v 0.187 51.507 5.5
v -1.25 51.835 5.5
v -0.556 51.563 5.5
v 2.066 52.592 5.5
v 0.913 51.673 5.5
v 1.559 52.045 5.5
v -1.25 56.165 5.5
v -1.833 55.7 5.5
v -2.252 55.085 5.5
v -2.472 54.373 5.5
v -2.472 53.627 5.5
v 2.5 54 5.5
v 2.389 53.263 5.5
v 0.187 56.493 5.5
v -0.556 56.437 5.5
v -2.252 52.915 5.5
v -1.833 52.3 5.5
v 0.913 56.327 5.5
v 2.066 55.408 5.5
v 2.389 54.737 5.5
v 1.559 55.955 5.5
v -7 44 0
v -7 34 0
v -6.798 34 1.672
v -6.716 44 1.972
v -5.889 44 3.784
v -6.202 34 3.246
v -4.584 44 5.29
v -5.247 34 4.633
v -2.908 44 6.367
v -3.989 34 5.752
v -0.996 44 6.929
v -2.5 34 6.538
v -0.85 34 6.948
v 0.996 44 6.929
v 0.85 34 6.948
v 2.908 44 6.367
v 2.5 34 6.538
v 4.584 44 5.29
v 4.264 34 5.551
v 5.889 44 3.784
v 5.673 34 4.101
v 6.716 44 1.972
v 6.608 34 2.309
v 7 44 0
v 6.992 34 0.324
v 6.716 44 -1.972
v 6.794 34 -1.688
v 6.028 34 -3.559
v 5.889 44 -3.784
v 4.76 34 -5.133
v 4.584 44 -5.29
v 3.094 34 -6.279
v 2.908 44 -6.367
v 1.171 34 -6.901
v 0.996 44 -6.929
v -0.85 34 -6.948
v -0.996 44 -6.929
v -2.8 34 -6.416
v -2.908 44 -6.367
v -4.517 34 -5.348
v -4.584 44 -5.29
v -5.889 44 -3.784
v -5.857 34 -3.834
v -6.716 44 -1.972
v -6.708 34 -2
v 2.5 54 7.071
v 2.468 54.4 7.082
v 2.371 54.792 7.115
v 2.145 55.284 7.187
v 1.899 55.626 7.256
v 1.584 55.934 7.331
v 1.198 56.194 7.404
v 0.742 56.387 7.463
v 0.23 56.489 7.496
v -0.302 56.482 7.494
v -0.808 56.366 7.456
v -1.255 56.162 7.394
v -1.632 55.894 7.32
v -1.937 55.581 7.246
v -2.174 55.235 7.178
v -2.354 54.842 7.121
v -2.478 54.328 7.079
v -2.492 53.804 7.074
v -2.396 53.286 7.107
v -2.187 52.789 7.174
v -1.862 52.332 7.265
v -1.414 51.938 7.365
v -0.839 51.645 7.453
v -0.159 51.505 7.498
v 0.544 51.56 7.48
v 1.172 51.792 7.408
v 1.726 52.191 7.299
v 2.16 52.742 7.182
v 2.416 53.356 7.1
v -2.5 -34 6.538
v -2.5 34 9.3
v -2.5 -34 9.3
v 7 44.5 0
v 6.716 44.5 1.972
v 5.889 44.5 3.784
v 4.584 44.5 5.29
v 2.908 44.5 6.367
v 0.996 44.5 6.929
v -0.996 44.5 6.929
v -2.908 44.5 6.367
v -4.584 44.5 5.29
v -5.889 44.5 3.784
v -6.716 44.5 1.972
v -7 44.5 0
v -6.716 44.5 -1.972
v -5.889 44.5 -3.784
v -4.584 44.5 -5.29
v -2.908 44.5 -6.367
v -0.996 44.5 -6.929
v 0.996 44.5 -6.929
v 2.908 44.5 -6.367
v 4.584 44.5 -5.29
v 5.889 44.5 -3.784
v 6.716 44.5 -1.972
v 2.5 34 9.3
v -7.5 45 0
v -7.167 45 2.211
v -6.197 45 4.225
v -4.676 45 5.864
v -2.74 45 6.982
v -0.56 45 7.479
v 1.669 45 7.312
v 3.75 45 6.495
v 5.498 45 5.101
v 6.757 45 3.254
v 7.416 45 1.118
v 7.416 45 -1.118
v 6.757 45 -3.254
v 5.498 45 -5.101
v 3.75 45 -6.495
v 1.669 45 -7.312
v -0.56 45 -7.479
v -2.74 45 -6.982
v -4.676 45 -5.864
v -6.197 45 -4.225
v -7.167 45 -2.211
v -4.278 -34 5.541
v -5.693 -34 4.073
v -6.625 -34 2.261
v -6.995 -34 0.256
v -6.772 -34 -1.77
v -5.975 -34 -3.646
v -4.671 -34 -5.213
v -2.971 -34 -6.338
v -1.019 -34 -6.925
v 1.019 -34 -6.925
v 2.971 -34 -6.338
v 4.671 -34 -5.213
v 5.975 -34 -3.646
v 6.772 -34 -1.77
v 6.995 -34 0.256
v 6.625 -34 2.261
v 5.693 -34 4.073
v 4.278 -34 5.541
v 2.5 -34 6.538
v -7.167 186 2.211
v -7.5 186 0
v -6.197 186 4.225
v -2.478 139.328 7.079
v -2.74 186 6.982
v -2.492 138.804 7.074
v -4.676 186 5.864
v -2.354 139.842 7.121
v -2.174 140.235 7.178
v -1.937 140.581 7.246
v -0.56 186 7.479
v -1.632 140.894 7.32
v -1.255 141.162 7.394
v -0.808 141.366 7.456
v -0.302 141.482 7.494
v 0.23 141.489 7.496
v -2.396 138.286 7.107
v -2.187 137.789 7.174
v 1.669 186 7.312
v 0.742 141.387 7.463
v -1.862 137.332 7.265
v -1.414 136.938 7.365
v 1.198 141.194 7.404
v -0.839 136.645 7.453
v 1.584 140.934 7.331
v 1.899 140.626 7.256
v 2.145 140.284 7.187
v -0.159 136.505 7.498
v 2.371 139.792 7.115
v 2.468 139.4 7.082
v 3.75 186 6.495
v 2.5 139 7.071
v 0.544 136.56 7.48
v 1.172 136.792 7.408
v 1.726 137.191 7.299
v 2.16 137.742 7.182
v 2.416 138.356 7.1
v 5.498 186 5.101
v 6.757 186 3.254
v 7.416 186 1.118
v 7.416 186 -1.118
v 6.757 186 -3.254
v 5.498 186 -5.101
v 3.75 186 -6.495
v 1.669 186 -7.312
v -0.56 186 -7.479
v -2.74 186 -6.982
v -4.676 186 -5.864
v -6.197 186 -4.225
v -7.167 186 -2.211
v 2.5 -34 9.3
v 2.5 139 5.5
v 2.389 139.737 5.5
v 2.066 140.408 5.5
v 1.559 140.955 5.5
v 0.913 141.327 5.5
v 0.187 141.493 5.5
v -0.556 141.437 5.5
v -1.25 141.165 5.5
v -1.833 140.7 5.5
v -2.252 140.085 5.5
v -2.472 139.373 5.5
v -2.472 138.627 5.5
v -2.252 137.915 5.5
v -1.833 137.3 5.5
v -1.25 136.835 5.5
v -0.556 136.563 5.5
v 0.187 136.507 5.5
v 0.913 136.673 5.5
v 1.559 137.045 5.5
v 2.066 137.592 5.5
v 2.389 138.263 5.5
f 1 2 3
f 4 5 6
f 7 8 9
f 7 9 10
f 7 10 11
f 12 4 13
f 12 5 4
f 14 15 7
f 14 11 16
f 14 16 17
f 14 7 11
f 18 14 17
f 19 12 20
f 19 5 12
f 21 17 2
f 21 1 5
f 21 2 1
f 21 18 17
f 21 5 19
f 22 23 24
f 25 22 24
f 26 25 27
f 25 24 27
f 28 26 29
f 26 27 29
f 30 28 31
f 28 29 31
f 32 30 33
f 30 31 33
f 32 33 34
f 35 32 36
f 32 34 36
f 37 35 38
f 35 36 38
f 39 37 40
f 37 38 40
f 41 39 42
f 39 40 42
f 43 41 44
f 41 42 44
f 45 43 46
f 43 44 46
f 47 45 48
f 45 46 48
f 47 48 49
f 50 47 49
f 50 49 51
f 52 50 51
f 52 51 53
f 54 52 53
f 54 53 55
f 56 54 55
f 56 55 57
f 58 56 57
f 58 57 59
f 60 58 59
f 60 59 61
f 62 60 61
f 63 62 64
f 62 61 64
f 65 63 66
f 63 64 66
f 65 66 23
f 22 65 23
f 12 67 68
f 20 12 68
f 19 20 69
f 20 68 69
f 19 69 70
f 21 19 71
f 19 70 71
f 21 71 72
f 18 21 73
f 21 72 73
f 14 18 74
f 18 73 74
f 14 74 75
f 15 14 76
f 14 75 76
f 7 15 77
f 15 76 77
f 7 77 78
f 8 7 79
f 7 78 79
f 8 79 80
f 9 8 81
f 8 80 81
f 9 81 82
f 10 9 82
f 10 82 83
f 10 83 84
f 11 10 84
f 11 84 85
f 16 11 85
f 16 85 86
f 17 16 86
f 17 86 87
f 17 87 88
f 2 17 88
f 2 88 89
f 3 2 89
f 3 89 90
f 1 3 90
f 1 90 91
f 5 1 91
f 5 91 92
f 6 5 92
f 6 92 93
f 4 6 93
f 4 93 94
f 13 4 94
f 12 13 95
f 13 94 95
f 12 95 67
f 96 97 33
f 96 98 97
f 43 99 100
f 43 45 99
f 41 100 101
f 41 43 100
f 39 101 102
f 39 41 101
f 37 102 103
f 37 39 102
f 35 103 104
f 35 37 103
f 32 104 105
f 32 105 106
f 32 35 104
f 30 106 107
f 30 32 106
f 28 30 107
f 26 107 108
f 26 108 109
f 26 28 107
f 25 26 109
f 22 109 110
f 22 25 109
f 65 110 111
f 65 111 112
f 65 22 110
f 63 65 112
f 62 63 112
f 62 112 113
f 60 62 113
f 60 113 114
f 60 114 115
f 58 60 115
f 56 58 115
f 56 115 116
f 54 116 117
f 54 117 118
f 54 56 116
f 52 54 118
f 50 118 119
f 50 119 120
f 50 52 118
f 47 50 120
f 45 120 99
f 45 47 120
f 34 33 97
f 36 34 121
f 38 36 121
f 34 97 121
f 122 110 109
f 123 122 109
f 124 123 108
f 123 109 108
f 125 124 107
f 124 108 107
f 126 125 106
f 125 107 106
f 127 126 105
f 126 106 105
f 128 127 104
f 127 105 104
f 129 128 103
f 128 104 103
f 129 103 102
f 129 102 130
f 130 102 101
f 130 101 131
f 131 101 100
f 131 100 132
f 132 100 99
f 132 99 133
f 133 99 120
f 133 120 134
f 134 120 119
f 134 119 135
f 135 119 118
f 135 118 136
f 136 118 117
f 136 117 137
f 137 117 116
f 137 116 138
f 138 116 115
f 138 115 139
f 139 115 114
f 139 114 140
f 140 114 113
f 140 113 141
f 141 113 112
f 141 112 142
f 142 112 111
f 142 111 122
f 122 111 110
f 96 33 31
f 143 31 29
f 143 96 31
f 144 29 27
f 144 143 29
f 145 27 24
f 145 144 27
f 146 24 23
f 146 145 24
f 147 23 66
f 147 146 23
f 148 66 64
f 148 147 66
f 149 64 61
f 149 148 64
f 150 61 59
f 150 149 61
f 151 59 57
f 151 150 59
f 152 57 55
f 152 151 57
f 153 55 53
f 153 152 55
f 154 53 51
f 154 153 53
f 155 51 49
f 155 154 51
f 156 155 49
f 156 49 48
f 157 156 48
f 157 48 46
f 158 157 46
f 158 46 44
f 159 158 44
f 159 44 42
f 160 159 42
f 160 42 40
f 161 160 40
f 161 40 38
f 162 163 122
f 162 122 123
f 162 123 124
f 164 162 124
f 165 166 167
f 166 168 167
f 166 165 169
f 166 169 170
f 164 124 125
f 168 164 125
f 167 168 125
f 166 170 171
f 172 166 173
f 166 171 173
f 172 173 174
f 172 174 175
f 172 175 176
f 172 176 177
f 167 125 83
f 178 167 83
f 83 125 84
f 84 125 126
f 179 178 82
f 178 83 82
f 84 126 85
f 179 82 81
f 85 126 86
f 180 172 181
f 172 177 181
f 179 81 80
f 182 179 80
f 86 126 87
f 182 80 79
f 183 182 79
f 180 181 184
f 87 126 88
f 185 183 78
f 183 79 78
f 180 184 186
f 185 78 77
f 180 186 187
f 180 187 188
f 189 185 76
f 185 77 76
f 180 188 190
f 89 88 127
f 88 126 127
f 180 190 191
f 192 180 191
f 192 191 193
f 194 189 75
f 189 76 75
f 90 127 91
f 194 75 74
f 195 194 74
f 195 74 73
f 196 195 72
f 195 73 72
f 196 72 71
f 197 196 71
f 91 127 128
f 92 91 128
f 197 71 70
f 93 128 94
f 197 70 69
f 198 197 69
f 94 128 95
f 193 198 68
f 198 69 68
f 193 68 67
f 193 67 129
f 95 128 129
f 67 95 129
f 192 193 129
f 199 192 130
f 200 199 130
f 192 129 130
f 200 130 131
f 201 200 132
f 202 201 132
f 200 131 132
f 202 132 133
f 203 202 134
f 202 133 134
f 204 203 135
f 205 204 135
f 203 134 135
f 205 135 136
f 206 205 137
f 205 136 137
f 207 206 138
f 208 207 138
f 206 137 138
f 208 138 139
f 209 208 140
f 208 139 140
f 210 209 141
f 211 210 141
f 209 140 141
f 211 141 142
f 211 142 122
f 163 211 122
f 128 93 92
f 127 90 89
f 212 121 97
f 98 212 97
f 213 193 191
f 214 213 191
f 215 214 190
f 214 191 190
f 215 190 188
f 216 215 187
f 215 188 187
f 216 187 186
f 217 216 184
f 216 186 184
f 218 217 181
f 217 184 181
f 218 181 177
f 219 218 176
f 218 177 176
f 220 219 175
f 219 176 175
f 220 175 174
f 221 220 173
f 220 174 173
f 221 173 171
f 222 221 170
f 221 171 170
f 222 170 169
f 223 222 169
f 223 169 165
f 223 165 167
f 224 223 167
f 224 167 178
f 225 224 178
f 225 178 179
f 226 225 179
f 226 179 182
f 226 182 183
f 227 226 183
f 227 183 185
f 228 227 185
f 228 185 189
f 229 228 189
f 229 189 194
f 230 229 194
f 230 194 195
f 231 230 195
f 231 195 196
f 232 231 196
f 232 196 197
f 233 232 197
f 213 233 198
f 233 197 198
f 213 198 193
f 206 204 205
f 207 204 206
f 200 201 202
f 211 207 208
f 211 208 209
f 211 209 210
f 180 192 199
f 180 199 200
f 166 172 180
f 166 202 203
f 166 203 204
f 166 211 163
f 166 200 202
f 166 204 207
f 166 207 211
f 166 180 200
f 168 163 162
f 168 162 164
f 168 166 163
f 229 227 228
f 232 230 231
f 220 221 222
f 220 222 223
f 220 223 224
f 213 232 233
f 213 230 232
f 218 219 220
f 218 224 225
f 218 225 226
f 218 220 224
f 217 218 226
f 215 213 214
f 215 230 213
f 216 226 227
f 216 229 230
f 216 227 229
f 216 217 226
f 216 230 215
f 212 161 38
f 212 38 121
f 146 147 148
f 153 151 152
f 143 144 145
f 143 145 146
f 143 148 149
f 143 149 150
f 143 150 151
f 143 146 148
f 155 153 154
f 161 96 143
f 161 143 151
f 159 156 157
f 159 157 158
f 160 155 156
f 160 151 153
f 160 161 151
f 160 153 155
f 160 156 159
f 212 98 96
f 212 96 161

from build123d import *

# Parameters (mm, degrees)
F1_DEPTH    = 34
F2_R        = 7
F3_DEPTH    = 10
F4_R        = 7.5
F5_DEPTH    = 142
F7_R        = 2.5
F8_DEPTH    = 2
F9_S5_R     = 7
F9_T6_DEPTH = 12


# Not quite as in the source:
# - a fillet or chamfer that OpenCascade refuses, or shapes differently, is made with other operations: its cross-section is extruded or revolved along the edge and cut away or added
# - after a boolean that leaves OpenCascade's solid faulty, fix() repairs it


with BuildPart() as f1:
    # F0 (on Front) → F1 (new body, symmetric)
    with BuildSketch(Plane.XZ):
        with BuildLine():
            Line((-2.5, 9.3003484153), (-2.5, 6.5383484153))
            ThreePointArc((-2.5, 6.5383484153), (0, -7), (2.5, 6.5383484153))
            Line((2.5, 6.5383484153), (2.5, 9.3003484153))
            Line((2.5, 9.3003484153), (-2.5, 9.3003484153))
        make_face()
    extrude(amount=F1_DEPTH, both=True)

    # F2 (on face) → F3 (join)
    with BuildSketch(Plane(origin=(0, 34, 0), x_dir=(-1, 0, 0), z_dir=(0, 1, 0))):
        Circle(F2_R)
    extrude(amount=F3_DEPTH)

    # F4 (on face) → F5 (join)
    with BuildSketch(Plane(origin=(0, 44, 0), x_dir=(-1, 0, 0), z_dir=(0, 1, 0))):
        Circle(F4_R)
    extrude(amount=F5_DEPTH)

    add(f1.part.fix(), mode=Mode.REPLACE)

    # F7 (on offset) → F8 (cut)
    with BuildSketch(Plane.XY.offset(7.5)):
        with Locations((0, 54)):
            Circle(F7_R)
        with Locations((0, 139)):
            Circle(F7_R)
    extrude(amount=-F8_DEPTH, mode=Mode.SUBTRACT)

    # F9: chamfer of 1 on 1 edges, made by hand


with BuildPart() as f9_tool2:
    # F9_s3 → F9_t4 (revolve)
    with BuildSketch(Plane.XY):
        Polygon((-7.5, 45), (-6.5, 44), (-7.5, 44), align=None)
    revolve(axis=Axis((0, 44, 0), (0, 1, 0)))

    # F9_s5 → F9_t6 (cut, symmetric)
    with BuildSketch(Plane.XZ.offset(-44.5)):
        Circle(F9_S5_R)
    extrude(amount=F9_T6_DEPTH, both=True, mode=Mode.SUBTRACT)


with BuildPart() as f1_1:
    add(f1.part)

    # F9_t1: cut F9_tool2
    add(f9_tool2.part, mode=Mode.SUBTRACT)


solid = f1_1.part
